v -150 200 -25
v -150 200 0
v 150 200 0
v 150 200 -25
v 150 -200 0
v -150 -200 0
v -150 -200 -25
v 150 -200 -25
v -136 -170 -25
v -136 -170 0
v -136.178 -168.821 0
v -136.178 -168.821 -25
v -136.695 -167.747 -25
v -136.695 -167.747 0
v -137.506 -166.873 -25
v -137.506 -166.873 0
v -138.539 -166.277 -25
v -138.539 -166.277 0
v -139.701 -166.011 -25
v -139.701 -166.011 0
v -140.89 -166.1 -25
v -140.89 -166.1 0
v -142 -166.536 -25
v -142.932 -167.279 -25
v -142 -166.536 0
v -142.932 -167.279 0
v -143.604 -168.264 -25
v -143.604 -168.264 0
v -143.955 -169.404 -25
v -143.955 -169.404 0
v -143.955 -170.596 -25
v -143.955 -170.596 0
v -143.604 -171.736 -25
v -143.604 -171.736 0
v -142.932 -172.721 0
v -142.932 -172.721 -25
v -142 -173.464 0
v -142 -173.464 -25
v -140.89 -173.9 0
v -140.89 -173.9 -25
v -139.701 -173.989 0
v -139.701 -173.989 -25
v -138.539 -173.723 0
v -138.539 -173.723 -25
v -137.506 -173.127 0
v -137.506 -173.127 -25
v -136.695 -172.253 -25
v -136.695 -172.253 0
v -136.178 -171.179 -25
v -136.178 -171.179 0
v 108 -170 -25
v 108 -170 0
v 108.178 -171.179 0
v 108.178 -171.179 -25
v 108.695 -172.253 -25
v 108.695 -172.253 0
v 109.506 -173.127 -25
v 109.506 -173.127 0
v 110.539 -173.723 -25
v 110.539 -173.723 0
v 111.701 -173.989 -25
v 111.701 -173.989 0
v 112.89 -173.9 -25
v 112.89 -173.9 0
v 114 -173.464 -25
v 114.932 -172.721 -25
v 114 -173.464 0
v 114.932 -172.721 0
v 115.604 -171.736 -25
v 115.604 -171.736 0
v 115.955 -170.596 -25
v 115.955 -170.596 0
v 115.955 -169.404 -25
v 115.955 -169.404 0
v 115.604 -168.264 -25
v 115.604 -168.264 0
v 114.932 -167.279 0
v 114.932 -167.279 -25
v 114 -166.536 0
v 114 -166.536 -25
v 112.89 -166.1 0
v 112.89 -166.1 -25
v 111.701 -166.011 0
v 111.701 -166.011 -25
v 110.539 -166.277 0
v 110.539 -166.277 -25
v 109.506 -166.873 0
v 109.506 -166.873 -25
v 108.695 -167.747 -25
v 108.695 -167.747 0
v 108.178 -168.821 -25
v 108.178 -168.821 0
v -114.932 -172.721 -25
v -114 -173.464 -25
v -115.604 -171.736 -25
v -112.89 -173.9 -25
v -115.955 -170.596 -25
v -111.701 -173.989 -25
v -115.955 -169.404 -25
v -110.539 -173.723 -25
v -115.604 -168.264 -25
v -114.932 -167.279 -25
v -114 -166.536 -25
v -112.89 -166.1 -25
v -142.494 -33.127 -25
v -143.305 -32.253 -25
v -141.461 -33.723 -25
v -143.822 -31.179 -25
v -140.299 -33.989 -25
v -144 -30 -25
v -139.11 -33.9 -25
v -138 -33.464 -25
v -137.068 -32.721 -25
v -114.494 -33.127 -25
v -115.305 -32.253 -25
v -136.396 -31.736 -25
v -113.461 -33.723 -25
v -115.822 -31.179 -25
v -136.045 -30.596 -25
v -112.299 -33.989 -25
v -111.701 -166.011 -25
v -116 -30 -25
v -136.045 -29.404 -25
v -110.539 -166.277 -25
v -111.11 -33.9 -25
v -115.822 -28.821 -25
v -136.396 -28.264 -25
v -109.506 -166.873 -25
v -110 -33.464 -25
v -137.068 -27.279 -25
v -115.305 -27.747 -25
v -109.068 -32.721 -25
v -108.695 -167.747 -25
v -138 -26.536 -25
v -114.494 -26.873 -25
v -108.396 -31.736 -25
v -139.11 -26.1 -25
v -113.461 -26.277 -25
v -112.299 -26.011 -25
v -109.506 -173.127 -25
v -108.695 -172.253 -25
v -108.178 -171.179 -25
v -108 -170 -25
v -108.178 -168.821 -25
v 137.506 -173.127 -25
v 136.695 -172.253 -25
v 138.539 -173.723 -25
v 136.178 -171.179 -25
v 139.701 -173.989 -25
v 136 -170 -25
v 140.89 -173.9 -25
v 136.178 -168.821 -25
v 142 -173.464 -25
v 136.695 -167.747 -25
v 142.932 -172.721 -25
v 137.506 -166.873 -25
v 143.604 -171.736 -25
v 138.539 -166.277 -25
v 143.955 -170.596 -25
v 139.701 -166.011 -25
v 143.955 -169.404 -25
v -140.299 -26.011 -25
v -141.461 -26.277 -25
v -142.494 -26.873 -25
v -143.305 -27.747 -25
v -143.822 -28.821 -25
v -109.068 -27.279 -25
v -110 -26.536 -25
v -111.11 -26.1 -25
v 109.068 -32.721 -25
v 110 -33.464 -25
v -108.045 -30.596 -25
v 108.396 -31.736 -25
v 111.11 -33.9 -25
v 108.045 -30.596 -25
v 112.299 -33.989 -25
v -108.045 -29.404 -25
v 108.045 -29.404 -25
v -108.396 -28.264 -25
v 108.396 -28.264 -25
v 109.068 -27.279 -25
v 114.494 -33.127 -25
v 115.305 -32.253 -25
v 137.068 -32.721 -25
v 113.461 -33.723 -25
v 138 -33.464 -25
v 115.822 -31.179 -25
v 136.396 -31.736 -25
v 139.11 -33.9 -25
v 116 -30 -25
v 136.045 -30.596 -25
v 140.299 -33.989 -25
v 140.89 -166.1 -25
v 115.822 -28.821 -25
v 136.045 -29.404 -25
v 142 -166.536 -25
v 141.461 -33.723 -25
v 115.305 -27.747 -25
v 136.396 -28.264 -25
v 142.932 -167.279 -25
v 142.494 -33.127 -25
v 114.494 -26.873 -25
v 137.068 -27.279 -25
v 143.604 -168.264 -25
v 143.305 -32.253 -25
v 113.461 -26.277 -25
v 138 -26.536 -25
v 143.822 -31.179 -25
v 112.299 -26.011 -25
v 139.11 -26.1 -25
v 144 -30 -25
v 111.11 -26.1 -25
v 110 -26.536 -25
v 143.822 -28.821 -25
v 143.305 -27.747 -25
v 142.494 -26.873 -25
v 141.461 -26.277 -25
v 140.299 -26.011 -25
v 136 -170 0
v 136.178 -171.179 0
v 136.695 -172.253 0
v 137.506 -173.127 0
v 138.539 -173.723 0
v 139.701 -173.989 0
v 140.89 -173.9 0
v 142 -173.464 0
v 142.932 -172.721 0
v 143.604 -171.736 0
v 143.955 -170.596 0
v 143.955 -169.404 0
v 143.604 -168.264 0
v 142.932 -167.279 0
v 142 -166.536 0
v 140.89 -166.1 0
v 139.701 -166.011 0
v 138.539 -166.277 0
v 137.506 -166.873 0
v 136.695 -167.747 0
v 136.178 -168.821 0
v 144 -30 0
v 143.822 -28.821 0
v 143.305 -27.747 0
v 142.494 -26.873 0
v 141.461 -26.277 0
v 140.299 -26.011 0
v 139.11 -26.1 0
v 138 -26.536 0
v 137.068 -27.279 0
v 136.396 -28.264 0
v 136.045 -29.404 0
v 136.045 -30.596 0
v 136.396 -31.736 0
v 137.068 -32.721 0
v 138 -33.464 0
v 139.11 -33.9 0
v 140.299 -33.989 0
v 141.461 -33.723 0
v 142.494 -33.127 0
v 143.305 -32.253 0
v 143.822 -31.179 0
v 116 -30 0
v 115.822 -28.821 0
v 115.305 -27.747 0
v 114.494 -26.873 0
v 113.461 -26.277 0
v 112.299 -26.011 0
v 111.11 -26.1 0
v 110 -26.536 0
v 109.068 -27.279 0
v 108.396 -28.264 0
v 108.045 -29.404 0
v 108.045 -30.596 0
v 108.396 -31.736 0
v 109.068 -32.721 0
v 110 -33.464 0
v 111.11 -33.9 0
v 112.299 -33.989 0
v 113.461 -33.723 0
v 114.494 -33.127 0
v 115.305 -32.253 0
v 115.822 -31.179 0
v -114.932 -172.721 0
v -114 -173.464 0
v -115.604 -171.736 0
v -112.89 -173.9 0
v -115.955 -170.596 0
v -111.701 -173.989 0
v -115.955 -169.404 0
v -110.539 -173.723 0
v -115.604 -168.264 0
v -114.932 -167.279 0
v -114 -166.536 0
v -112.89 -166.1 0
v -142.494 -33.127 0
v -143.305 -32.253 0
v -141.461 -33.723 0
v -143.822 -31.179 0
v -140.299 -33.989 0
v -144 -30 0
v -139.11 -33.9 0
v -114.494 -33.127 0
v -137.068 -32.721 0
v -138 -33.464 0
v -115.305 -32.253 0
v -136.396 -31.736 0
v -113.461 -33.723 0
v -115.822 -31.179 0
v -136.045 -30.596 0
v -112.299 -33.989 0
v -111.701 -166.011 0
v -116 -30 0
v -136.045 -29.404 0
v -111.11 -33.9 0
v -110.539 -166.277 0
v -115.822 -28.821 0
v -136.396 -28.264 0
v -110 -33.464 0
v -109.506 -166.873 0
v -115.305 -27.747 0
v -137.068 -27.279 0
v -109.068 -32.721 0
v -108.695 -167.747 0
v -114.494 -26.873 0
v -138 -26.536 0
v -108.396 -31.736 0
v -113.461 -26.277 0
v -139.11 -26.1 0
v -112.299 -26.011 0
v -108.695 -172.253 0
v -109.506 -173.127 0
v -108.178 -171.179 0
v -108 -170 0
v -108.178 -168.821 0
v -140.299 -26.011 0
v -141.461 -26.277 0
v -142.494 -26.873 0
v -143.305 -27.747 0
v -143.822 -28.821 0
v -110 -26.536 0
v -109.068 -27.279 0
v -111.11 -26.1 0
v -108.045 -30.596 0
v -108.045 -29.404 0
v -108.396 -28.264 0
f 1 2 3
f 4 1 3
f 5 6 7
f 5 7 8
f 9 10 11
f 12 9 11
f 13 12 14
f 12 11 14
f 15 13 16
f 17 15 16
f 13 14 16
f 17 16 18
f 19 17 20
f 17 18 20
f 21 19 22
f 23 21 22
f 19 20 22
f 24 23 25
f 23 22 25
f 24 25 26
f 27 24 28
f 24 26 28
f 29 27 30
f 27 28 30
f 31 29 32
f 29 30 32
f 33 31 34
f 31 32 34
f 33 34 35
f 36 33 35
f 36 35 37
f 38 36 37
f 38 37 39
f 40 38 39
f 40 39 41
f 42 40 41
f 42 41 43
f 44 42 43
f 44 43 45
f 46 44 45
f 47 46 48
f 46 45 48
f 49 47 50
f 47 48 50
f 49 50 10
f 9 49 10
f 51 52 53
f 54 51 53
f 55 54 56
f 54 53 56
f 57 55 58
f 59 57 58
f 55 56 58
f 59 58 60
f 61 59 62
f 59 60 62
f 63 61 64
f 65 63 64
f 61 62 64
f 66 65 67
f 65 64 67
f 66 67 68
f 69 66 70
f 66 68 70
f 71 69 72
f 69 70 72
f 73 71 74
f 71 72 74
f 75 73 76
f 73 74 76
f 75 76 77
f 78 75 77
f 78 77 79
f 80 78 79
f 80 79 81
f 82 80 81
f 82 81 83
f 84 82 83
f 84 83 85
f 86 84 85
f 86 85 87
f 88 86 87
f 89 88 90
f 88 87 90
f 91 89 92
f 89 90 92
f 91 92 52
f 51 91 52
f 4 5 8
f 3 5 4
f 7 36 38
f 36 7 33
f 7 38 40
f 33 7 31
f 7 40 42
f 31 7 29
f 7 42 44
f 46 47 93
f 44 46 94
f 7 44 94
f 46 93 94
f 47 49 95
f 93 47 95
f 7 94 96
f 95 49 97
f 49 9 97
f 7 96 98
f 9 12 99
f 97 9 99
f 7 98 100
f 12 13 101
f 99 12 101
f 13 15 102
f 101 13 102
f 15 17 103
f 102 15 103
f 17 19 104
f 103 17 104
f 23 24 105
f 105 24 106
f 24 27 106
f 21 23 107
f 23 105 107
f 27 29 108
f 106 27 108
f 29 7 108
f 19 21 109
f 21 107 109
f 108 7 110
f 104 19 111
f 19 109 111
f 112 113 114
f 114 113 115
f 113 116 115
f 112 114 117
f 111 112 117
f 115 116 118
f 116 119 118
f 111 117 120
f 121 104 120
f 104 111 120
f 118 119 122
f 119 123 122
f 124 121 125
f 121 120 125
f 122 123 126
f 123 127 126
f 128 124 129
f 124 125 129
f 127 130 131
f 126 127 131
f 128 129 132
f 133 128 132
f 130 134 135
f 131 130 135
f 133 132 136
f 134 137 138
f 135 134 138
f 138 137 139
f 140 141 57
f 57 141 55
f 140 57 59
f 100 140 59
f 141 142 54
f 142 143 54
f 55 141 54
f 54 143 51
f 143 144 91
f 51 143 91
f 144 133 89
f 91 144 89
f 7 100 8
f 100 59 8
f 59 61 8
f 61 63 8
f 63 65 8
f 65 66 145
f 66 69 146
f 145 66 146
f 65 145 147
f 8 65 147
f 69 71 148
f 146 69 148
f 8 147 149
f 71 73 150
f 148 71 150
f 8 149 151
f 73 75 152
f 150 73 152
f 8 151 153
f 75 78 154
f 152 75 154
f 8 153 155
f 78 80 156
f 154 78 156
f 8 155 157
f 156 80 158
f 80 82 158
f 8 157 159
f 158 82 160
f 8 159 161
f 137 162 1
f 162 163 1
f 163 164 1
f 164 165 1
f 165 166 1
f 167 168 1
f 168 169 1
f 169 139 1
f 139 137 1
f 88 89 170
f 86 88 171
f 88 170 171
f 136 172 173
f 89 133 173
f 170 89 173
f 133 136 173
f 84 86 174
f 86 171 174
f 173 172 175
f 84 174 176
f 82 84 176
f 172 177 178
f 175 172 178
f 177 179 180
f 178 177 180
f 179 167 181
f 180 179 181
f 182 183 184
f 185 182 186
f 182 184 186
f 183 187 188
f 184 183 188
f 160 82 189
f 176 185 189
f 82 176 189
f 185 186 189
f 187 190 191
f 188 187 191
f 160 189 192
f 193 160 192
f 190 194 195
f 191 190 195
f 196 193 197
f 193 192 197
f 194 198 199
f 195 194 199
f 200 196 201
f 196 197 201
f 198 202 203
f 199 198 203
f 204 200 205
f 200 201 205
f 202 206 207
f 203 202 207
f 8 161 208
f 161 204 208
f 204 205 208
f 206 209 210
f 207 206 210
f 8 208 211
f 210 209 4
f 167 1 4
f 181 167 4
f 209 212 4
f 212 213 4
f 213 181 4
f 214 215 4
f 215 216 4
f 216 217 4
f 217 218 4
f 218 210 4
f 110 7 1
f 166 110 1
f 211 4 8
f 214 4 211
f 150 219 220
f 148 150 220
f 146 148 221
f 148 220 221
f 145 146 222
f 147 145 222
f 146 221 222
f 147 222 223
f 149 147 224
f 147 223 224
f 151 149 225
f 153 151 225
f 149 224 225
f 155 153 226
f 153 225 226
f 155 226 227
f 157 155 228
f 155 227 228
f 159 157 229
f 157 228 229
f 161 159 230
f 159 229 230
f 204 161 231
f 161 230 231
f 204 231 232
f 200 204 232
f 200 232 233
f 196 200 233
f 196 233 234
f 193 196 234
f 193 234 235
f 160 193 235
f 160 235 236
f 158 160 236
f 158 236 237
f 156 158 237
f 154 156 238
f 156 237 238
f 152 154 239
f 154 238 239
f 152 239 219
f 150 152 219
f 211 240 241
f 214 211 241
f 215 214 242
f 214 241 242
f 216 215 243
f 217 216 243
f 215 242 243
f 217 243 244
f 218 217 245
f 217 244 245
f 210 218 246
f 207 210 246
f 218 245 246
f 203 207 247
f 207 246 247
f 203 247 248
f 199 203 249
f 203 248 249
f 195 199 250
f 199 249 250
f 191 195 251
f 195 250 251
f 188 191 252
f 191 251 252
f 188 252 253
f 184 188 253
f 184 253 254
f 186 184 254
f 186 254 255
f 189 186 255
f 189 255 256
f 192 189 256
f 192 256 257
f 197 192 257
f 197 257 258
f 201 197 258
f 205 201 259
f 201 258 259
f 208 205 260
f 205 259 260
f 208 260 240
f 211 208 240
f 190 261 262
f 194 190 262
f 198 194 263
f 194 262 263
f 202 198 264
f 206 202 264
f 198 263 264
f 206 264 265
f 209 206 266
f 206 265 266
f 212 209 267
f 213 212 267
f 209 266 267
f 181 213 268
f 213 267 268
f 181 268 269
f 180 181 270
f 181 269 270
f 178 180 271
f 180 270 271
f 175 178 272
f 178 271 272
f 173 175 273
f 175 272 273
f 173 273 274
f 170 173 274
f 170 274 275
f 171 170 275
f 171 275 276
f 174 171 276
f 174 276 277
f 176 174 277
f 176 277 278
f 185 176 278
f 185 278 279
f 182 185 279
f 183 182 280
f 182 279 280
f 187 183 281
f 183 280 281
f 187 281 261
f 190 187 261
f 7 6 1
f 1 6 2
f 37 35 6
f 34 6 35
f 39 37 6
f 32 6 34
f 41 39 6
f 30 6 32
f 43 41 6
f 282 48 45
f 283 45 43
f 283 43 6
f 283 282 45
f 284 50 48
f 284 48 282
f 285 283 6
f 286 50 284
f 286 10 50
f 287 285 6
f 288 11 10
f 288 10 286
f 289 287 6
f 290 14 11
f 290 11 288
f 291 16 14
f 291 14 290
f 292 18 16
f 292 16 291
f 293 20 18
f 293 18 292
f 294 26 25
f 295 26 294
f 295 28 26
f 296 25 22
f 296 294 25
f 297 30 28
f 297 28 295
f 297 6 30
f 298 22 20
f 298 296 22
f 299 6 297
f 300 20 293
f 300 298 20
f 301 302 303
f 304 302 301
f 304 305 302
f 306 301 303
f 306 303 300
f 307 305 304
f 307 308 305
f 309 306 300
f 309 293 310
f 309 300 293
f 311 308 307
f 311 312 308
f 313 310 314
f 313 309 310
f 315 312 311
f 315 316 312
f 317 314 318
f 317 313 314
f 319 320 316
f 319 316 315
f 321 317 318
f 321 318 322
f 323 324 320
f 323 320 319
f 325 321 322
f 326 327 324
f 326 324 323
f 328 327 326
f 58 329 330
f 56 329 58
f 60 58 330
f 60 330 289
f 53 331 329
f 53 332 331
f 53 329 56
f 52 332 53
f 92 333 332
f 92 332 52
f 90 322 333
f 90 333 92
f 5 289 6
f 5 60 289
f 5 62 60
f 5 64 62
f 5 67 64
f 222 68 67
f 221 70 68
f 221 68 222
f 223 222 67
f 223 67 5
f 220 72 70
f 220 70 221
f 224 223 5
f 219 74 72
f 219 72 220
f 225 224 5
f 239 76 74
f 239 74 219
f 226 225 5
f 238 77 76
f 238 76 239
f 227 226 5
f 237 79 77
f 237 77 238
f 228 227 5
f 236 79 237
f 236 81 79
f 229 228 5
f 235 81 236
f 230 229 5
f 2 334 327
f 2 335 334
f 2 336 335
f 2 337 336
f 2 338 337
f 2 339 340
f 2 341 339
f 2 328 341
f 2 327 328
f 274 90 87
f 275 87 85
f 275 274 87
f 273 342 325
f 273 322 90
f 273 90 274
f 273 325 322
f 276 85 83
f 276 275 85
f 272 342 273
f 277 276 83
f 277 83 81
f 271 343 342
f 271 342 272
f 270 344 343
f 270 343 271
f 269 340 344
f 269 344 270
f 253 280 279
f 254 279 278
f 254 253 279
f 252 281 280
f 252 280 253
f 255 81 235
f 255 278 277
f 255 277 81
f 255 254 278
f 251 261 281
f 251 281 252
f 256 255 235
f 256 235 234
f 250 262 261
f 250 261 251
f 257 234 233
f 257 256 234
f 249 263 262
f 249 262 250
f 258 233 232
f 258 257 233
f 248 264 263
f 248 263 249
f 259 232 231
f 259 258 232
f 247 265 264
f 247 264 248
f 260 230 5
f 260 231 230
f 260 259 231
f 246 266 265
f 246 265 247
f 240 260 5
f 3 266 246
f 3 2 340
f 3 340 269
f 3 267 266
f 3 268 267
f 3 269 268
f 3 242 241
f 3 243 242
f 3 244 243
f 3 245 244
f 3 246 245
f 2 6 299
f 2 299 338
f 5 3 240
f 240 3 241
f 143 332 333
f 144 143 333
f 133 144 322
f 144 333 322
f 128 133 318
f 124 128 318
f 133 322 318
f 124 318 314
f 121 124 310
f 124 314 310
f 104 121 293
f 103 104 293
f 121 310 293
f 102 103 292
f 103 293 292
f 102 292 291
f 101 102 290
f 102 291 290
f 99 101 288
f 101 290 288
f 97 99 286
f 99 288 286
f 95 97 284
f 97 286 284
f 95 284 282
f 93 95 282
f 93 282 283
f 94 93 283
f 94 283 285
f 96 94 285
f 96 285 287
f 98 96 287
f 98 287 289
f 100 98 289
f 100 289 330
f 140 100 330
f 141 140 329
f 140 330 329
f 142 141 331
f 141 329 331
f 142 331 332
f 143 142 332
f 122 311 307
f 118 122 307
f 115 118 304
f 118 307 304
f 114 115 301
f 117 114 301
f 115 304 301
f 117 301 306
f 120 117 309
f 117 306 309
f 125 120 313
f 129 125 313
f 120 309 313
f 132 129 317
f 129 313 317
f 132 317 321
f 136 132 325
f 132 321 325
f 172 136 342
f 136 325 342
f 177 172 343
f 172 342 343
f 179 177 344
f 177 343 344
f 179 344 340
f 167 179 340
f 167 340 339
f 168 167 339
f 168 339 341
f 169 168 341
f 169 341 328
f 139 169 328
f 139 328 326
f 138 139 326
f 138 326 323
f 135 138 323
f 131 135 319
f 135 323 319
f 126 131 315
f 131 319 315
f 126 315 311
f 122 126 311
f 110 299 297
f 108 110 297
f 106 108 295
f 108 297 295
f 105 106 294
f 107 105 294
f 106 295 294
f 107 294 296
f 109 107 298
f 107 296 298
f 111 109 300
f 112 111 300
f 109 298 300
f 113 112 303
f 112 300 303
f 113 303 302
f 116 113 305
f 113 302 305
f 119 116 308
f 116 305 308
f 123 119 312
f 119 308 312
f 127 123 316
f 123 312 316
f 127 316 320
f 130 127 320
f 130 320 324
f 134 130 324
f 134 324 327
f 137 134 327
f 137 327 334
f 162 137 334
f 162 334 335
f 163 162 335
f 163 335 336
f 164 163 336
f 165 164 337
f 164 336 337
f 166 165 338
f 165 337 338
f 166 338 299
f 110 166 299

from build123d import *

# Parameters (mm, degrees)
SKETCH1_W           = 300
SKETCH1_H           = 400
SKETCH1_R           = 4
BOSS_EXTRUDE1_DEPTH = 25


with BuildPart() as part:
    # Sketch1 → Boss-Extrude1 (new body)
    with BuildSketch(Plane.XY):
        Rectangle(SKETCH1_W, SKETCH1_H)
        with Locations((-112, -170)):
            Circle(SKETCH1_R, mode=Mode.SUBTRACT)
        with Locations((-140, -170)):
            Circle(SKETCH1_R, mode=Mode.SUBTRACT)
        with Locations(Location((112, -170, 0), (0, 0, 180))):
            Circle(SKETCH1_R, mode=Mode.SUBTRACT)
        with Locations(Location((140, -170, 0), (0, 0, 180))):
            Circle(SKETCH1_R, mode=Mode.SUBTRACT)
        with Locations((112, -30)):
            Circle(SKETCH1_R, mode=Mode.SUBTRACT)
        with Locations((140, -30)):
            Circle(SKETCH1_R, mode=Mode.SUBTRACT)
        with Locations(Location((-112, -30, 0), (0, 0, 180))):
            Circle(SKETCH1_R, mode=Mode.SUBTRACT)
        with Locations(Location((-140, -30, 0), (0, 0, 180))):
            Circle(SKETCH1_R, mode=Mode.SUBTRACT)
    extrude(amount=-BOSS_EXTRUDE1_DEPTH)


solid = part.part
